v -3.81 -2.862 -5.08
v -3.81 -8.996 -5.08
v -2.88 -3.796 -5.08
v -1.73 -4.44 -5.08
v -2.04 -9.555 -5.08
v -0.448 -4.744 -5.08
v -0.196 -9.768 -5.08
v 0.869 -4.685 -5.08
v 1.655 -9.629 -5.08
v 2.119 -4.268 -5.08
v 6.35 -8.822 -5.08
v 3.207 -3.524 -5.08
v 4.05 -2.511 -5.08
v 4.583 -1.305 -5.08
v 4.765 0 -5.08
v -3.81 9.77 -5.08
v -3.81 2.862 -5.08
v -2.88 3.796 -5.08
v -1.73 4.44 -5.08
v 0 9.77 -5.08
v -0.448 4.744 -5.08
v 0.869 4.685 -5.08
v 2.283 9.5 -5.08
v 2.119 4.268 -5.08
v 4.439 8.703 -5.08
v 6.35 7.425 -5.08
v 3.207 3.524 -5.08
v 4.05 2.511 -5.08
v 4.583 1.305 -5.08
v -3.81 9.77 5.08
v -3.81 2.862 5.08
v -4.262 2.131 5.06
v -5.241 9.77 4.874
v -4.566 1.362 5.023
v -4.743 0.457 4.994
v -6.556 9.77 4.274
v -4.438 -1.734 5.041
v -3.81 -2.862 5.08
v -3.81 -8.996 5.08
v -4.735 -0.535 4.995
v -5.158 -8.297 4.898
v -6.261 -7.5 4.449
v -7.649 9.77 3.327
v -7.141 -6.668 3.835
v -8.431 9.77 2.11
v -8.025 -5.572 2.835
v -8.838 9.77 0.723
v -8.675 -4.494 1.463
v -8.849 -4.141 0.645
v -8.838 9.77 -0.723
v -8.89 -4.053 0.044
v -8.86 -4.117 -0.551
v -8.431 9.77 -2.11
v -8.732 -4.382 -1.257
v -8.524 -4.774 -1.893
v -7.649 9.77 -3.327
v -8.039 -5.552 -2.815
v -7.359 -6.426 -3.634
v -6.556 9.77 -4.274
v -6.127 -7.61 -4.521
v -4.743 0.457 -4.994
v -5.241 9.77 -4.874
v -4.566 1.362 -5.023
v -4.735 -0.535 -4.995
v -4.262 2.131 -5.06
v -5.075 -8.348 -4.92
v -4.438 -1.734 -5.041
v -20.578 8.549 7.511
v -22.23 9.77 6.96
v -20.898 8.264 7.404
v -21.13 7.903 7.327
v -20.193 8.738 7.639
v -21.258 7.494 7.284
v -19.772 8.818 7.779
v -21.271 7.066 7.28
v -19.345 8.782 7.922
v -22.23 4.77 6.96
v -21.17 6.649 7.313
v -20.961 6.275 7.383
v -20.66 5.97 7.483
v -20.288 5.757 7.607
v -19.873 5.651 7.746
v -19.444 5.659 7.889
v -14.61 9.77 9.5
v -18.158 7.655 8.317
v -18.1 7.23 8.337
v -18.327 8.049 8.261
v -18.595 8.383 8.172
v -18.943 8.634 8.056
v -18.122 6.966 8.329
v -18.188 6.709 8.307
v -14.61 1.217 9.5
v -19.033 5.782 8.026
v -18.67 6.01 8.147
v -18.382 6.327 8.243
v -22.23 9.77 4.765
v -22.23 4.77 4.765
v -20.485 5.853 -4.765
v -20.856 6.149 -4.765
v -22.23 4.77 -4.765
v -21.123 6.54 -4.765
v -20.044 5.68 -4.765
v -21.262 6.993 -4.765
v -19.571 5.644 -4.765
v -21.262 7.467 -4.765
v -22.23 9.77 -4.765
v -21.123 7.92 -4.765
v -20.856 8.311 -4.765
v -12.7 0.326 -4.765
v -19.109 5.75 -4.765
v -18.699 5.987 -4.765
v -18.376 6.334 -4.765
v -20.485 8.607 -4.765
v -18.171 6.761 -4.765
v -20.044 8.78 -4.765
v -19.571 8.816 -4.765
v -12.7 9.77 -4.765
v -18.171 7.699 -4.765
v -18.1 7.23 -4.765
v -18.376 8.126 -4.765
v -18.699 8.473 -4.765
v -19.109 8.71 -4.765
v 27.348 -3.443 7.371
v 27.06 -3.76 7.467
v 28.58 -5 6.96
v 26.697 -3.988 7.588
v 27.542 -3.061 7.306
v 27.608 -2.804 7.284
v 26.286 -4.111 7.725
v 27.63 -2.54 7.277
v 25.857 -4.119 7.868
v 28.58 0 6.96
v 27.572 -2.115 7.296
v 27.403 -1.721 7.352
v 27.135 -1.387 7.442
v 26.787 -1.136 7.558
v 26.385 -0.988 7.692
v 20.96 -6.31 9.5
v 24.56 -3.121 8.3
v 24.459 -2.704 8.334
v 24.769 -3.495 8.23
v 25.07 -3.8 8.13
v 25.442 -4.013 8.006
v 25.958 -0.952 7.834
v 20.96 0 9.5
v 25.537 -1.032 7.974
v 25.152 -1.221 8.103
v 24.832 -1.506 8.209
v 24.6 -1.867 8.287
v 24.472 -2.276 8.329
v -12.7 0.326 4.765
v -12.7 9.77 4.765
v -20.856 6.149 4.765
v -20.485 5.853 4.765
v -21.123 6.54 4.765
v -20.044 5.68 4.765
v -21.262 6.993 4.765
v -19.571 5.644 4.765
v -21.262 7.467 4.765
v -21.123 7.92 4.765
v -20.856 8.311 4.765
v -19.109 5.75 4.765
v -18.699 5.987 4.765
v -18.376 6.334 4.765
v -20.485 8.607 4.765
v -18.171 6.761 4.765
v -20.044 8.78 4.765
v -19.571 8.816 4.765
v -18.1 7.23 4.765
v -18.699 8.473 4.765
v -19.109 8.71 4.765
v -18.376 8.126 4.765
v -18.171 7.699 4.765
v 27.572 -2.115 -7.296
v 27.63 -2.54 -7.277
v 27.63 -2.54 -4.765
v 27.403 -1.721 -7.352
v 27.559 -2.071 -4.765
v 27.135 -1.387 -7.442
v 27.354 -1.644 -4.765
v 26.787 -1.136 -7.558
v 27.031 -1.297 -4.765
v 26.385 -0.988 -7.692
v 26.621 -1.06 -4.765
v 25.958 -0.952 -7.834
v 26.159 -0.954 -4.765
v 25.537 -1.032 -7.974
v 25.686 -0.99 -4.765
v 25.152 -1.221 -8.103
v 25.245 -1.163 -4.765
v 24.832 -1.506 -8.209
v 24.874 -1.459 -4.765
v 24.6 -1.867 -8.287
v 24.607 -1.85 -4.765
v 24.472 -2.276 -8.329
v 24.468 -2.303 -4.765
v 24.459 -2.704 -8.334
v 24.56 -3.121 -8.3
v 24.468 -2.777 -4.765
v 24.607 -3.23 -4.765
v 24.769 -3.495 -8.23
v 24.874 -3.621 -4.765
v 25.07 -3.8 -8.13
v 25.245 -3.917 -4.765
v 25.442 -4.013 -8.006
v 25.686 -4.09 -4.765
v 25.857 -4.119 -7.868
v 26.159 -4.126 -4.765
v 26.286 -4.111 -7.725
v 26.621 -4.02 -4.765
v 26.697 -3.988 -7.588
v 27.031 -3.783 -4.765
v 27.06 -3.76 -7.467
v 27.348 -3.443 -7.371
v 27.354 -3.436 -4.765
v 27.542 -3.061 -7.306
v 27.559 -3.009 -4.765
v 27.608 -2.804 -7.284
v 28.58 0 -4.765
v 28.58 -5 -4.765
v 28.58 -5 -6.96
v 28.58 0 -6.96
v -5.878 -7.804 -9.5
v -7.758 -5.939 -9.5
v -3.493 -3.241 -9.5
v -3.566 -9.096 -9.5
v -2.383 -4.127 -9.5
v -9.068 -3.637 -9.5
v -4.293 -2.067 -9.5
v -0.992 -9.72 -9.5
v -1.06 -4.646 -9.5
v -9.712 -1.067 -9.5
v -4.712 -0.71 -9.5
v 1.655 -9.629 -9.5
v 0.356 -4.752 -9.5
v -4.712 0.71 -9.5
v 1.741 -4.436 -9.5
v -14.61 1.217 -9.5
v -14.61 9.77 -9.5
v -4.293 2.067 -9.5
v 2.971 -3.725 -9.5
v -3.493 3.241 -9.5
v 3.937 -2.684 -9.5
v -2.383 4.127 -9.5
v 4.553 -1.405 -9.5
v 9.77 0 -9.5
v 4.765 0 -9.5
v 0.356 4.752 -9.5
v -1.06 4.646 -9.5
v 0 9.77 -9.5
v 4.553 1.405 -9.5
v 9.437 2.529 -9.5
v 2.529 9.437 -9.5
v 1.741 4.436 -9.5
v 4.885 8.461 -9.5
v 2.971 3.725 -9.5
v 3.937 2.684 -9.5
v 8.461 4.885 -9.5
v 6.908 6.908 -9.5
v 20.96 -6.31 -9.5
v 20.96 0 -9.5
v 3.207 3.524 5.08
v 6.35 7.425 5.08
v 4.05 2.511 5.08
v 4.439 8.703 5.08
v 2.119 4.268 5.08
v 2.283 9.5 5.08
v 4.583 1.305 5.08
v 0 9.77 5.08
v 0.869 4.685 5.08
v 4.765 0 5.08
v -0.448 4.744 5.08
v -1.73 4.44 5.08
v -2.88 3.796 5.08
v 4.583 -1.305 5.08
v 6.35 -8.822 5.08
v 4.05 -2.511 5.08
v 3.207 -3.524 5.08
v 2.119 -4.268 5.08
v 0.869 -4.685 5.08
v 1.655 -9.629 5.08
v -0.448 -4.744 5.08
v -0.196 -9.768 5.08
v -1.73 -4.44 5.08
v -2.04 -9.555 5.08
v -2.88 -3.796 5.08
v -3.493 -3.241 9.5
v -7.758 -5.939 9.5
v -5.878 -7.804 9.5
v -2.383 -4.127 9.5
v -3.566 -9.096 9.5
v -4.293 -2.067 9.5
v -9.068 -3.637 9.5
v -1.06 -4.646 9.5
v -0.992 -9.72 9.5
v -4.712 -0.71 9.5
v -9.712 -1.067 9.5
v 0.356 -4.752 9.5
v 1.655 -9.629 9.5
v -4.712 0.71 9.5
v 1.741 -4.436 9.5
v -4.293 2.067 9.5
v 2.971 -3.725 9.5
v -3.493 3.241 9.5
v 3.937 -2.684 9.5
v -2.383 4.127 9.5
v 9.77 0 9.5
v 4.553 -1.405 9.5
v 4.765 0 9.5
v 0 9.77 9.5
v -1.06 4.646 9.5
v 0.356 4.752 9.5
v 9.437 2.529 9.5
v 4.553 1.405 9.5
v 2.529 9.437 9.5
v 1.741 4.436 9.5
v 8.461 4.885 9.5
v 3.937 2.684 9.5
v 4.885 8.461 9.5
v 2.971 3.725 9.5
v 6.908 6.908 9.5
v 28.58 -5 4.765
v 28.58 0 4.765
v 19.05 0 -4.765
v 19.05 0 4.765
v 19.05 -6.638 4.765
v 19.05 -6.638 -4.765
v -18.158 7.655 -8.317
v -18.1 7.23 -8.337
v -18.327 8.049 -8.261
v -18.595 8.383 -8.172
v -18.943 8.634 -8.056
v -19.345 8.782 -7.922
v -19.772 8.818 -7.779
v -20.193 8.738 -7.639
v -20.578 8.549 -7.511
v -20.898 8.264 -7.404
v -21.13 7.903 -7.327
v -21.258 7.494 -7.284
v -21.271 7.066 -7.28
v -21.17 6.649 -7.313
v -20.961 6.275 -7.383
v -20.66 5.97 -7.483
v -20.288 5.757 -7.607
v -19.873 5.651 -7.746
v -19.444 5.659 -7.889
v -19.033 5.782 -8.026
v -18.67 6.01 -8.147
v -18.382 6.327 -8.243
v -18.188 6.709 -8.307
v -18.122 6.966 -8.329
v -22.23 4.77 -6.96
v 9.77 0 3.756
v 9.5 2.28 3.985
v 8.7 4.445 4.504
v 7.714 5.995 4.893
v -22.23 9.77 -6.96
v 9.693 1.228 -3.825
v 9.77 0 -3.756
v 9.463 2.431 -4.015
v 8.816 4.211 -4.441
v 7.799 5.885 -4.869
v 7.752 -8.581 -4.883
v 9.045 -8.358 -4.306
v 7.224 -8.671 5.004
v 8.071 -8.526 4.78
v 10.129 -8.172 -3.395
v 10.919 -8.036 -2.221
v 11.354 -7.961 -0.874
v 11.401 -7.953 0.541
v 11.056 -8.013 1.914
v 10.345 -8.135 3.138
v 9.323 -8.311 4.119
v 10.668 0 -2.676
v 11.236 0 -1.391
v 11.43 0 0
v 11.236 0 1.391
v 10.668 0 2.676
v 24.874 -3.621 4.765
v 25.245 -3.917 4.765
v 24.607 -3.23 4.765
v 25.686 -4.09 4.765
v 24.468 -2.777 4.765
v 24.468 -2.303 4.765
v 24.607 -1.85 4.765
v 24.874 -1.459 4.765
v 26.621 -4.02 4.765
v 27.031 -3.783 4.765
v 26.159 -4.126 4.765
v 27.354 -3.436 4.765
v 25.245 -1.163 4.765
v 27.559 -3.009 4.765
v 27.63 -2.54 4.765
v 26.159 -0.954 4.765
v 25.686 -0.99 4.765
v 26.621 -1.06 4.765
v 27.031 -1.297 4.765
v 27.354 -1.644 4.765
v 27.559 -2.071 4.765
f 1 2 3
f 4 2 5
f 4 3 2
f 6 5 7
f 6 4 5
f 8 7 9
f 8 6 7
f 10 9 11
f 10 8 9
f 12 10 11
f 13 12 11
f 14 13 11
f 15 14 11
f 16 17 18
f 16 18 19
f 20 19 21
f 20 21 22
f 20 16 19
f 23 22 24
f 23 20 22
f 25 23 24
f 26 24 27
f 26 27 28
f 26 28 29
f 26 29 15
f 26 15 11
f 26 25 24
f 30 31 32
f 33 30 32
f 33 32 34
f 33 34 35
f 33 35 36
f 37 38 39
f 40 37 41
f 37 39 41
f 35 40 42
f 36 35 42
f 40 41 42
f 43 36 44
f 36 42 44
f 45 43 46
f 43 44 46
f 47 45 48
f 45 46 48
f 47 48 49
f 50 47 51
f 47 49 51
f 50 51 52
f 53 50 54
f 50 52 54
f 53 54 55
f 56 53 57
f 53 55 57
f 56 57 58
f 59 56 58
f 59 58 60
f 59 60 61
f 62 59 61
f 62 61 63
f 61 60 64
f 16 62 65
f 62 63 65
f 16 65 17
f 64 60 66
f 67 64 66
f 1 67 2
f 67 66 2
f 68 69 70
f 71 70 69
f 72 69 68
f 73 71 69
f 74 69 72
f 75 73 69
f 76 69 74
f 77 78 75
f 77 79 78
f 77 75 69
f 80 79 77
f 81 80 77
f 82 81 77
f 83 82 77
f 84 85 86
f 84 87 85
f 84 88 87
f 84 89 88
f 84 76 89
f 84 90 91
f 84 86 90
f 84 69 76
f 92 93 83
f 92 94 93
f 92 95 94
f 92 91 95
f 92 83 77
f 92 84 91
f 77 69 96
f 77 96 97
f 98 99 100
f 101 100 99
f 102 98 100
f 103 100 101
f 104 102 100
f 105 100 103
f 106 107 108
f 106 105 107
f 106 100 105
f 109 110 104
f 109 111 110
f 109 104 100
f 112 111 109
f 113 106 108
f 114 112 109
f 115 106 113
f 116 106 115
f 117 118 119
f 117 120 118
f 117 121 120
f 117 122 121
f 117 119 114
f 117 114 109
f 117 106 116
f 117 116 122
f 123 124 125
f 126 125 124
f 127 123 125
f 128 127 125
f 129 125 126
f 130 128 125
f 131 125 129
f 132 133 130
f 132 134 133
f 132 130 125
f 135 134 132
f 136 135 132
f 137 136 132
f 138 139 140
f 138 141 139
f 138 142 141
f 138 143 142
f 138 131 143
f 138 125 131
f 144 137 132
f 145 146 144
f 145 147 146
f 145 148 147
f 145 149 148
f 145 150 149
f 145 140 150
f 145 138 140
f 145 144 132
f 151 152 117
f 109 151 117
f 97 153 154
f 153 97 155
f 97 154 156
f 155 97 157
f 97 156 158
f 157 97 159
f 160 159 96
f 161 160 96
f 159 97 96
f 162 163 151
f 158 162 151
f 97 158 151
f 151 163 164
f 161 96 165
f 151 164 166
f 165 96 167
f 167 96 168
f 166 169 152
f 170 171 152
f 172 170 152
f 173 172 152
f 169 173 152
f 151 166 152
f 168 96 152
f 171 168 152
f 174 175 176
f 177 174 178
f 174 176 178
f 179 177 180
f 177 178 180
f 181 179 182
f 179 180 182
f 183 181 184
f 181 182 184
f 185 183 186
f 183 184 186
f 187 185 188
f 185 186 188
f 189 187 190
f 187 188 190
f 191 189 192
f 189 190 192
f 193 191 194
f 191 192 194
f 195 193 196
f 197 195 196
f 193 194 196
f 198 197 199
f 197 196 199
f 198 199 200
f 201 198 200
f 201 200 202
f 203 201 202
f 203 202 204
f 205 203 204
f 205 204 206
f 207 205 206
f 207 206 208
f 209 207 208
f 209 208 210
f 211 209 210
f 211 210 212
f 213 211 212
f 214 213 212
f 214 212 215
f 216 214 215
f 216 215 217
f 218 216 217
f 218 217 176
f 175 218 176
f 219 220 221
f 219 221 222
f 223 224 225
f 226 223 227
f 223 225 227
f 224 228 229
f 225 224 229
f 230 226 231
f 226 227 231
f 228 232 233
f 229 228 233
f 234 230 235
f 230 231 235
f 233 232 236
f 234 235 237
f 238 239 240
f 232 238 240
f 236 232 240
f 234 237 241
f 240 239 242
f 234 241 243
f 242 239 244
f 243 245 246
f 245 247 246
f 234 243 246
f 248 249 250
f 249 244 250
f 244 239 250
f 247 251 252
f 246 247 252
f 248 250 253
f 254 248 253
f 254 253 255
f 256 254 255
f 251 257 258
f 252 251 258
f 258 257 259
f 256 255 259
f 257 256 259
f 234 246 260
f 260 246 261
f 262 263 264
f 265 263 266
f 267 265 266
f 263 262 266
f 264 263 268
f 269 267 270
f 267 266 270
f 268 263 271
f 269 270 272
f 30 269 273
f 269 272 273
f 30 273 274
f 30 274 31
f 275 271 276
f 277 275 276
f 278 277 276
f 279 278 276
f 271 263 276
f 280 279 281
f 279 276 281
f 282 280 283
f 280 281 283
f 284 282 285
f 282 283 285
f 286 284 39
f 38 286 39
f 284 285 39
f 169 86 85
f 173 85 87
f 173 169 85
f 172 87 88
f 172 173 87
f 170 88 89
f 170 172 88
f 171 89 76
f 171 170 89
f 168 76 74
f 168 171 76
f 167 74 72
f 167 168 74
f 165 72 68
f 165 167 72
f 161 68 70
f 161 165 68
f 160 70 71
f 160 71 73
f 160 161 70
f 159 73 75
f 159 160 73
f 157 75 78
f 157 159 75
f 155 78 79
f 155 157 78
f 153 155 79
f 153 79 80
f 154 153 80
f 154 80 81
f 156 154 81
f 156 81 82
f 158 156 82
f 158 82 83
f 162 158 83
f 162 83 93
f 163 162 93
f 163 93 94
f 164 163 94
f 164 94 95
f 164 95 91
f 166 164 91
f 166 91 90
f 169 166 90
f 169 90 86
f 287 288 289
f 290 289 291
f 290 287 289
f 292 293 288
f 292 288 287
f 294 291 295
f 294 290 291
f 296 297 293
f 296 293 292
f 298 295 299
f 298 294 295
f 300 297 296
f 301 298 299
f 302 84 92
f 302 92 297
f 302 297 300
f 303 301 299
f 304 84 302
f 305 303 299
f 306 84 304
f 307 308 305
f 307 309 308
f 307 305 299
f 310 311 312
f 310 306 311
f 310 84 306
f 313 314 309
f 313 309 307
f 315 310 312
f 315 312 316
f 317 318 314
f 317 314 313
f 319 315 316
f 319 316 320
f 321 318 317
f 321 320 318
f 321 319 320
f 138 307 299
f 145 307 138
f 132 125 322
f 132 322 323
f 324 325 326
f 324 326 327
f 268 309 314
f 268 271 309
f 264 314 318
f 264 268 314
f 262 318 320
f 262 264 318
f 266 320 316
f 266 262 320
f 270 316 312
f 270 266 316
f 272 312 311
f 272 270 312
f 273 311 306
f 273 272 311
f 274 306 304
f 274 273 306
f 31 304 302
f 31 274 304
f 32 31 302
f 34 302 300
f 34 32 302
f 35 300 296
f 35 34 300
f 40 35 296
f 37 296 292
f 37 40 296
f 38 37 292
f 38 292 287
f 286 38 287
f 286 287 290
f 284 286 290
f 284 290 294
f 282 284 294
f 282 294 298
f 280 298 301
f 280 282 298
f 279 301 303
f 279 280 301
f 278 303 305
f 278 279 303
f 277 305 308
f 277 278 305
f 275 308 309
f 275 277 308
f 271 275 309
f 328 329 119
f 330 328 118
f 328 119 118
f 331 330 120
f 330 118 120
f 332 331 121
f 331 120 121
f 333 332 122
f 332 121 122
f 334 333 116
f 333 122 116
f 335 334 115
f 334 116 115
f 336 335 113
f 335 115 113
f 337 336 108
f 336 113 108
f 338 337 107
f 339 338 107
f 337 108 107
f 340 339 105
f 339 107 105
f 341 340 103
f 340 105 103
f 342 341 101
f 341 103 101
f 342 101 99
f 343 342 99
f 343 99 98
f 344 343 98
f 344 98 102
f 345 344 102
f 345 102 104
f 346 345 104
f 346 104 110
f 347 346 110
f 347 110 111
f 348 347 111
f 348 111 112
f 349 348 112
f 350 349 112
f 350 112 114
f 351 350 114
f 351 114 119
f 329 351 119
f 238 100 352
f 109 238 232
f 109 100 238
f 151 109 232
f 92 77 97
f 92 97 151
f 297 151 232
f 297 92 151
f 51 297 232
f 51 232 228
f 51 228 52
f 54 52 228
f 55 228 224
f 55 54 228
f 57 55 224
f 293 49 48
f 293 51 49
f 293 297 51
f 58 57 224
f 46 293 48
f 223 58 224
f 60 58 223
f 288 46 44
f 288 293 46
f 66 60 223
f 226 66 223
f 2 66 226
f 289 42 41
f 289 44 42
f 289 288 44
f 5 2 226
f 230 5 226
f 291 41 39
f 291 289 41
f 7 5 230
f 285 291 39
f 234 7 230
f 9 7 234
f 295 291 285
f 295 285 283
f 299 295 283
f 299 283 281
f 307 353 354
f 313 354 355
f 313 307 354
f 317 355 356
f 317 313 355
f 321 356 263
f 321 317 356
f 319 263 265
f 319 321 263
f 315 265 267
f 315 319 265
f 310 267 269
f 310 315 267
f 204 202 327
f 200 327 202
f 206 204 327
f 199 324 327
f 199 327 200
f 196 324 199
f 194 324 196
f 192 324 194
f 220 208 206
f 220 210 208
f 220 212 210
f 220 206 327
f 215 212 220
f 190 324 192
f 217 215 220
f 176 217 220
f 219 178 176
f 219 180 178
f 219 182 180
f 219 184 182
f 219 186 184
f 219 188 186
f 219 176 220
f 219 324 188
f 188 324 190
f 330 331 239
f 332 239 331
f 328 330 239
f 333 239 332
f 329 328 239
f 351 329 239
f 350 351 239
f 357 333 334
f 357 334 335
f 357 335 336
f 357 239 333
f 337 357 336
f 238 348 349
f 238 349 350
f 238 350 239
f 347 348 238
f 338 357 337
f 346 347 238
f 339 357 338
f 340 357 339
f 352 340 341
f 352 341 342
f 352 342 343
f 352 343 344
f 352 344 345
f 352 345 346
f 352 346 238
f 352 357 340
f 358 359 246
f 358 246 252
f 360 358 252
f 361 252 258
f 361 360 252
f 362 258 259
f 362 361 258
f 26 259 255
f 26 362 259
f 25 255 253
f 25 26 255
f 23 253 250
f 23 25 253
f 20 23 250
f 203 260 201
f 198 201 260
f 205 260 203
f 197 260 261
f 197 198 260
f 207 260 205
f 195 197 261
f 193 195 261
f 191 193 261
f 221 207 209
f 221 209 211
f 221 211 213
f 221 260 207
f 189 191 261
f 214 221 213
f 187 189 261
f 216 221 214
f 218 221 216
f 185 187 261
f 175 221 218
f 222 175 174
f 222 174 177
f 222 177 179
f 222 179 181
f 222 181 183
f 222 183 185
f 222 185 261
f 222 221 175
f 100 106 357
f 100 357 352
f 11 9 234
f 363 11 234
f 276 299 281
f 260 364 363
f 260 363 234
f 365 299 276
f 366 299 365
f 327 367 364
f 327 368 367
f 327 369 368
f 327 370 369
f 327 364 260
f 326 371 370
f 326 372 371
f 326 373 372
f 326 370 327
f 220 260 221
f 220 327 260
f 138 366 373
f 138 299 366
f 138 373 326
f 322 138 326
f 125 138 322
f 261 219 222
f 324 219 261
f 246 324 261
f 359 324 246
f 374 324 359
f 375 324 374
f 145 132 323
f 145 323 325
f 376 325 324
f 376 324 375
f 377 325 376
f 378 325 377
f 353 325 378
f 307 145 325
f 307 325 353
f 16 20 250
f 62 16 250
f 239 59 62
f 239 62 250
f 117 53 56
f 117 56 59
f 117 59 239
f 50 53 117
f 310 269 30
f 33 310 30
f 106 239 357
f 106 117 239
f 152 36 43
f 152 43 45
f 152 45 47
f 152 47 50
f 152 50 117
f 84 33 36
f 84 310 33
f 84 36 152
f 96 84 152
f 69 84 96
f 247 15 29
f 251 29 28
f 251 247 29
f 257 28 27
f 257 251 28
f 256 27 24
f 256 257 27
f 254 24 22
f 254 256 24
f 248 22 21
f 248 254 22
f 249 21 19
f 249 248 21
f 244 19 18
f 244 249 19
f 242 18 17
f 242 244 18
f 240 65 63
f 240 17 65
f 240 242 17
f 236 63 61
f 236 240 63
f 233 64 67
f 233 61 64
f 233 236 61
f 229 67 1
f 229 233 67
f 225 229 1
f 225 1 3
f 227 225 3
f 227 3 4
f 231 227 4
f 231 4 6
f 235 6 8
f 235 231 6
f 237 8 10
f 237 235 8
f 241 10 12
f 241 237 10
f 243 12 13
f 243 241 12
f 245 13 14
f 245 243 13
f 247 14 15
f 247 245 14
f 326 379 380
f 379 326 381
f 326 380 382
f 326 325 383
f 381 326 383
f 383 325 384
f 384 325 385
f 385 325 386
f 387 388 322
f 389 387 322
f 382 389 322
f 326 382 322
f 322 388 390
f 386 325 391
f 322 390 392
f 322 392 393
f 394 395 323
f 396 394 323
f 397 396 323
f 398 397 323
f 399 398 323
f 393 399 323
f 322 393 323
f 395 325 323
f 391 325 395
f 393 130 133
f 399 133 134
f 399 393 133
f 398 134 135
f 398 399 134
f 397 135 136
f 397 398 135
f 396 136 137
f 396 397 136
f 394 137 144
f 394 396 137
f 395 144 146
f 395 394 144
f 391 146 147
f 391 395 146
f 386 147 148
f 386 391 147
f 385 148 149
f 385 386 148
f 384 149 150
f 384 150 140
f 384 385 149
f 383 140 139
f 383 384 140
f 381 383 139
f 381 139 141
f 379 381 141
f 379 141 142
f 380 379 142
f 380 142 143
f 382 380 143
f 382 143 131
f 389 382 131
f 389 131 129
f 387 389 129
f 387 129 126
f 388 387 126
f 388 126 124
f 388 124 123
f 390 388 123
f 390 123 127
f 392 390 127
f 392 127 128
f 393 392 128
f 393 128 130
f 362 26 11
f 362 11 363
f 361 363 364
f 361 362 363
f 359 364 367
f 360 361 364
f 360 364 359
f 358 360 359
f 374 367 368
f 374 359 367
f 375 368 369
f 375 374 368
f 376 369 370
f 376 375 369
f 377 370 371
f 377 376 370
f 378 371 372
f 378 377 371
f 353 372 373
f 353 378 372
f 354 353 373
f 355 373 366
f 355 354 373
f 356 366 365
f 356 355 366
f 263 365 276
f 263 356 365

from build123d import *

# Parameters (mm, degrees)
SKETCH1_R               = 4.765
BOSS_EXTRUDE1_DEPTH     = 9.5
CHAMFER1_SIZE           = 7.62
CHAMFER1_SIZE2          = 2.54
CHAMFER2_SIZE           = 2.54
CHAMFER2_SIZE2          = 7.62
CHAMFER2_PART_2_SIZE    = 2.54
CHAMFER2_PART_2_SIZE2   = 7.62
SKETCH5_W               = 9.53
SKETCH5_H               = 9.53
CUT_EXTRUDE1_DEPTH      = 20.54
CUT_EXTRUDE2_DEPTH      = 10.77
CUT_EXTRUDE2_DEPTH_BACK = 10.77
SKETCH7_R               = 1.59
CUT_EXTRUDE3_DEPTH      = 10.5000001
CUT_EXTRUDE3_DEPTH_BACK = 10.5000001


with BuildPart() as part:
    # Sketch1 → Boss-Extrude1 (new body, symmetric)
    with BuildSketch(Plane.XY):
        with BuildLine():
            Line((0, 9.77), (-22.23, 9.77))
            Line((-22.23, 9.77), (-22.23, 4.77))
            Line((-22.23, 4.77), (-9.711509246, -1.067468107))
            ThreePointArc((-9.711509246, -1.067468107), (-5.877874817, -7.804068659), (1.655323868, -9.628748771))
            Line((1.655323868, -9.628748771), (28.58, -5))
            Line((28.58, -5), (28.58, 0))
            Line((28.58, 0), (9.77, 0))
            ThreePointArc((9.77, 0), (6.908433252, 6.908433252), (0, 9.77))
        make_face()
        Circle(SKETCH1_R, mode=Mode.SUBTRACT)
    extrude(amount=BOSS_EXTRUDE1_DEPTH, both=True)

    # Chamfer1
    chamfer1_edges = [part.edges().sort_by_distance(p)[0] for p in [
        (-22.23, 7.27, -9.5),
        (28.58, -2.5, -9.5),
    ]]
    chamfer1_side = [part.faces().sort_by_distance(p)[0] for p in [
        (-11.115, 9.225622585, -9.5),
    ]]
    chamfer(chamfer1_edges, length=CHAMFER1_SIZE, length2=CHAMFER1_SIZE2, reference=chamfer1_side[0])

    # Chamfer2
    chamfer2_edges = [part.edges().sort_by_distance(p)[0] for p in [
        (-22.23, 7.27, 9.5),
    ]]
    chamfer2_side = [part.faces().sort_by_distance(p)[0] for p in [
        (-22.23, 7.27, 1.27),
    ]]
    chamfer(chamfer2_edges, length=CHAMFER2_SIZE, length2=CHAMFER2_SIZE2, reference=chamfer2_side[0])

    # Chamfer2 part 2
    chamfer2_part_2_edges = [part.edges().sort_by_distance(p)[0] for p in [
        (28.58, -2.5, 9.5),
    ]]
    chamfer2_part_2_side = [part.faces().sort_by_distance(p)[0] for p in [
        (28.58, -2.5, 1.27),
    ]]
    chamfer(chamfer2_part_2_edges, length=CHAMFER2_PART_2_SIZE, length2=CHAMFER2_PART_2_SIZE2, reference=chamfer2_part_2_side[0])

    # Sketch5 → Cut-Extrude1 (cut, through all)
    with BuildSketch(Plane(origin=(0, 9.77, 0), x_dir=(1, 0, 0), z_dir=(0, 1, 0))):
        with Locations((-17.465, 0)):
            Rectangle(SKETCH5_W, SKETCH5_H)
        with Locations((23.815, 0)):
            Rectangle(SKETCH5_W, SKETCH5_H)
    extrude(amount=-CUT_EXTRUDE1_DEPTH, mode=Mode.SUBTRACT)

    # Sketch6 → Cut-Extrude2 (cut, two sides)
    with BuildSketch(Plane(origin=(0, 0, 0), x_dir=(1, 0, 0), z_dir=(0, 1, 0))) as cut_extrude2_sk:
        with BuildLine():
            Line((-3.81, 5.08), (6.35, 5.08))
            ThreePointArc((6.35, 5.08), (11.43, 0), (6.35, -5.08))
            Line((6.35, -5.08), (-3.81, -5.08))
            ThreePointArc((-3.81, -5.08), (-8.89, 0), (-3.81, 5.08))
        make_face()
    extrude(amount=CUT_EXTRUDE2_DEPTH, mode=Mode.SUBTRACT)
    extrude(cut_extrude2_sk.sketch, amount=-CUT_EXTRUDE2_DEPTH_BACK, mode=Mode.SUBTRACT)

    # Sketch7 → Cut-Extrude3 (cut, two sides)
    with BuildSketch(Plane.XY) as cut_extrude3_sk:
        with Locations((-19.69, 7.23)):
            Circle(SKETCH7_R)
        with Locations((26.04, -2.54)):
            Circle(SKETCH7_R)
    extrude(amount=CUT_EXTRUDE3_DEPTH, mode=Mode.SUBTRACT)
    extrude(cut_extrude3_sk.sketch, amount=-CUT_EXTRUDE3_DEPTH_BACK, mode=Mode.SUBTRACT)


solid = part.part
